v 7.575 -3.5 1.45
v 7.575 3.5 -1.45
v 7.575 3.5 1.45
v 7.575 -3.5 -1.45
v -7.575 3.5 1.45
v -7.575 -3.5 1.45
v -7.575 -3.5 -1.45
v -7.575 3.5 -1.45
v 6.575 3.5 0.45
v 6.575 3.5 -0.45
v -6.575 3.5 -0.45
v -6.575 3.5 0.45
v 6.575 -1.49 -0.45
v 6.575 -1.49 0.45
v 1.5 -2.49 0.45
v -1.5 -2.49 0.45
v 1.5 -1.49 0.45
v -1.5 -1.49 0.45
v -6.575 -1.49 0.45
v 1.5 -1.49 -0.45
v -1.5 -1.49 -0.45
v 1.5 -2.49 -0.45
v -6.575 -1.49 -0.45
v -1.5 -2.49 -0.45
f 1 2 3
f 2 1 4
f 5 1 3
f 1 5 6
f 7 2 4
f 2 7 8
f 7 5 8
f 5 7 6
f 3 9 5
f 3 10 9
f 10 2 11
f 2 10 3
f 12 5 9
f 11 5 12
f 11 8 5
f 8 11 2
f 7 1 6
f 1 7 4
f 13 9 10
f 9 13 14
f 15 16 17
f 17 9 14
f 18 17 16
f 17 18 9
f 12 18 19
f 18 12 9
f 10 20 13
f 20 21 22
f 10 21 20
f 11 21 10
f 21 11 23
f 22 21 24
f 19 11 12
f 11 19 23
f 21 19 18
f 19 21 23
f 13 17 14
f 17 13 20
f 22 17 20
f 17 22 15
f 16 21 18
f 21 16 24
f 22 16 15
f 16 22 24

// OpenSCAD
holeWidth = 13.15;
holeHeight = 0.9;
holeDepth = 5;
surround=2;

difference() {
    cube([holeWidth+surround, holeDepth+surround, holeHeight+surround], center=true);
    translate([0,surround/2+0.01,0])
    cube([holeWidth, holeDepth, holeHeight], center=true);
    translate([0,surround/2+0.01-0.5,0])
    cube([3, holeDepth+1, holeHeight], center=true);
}
